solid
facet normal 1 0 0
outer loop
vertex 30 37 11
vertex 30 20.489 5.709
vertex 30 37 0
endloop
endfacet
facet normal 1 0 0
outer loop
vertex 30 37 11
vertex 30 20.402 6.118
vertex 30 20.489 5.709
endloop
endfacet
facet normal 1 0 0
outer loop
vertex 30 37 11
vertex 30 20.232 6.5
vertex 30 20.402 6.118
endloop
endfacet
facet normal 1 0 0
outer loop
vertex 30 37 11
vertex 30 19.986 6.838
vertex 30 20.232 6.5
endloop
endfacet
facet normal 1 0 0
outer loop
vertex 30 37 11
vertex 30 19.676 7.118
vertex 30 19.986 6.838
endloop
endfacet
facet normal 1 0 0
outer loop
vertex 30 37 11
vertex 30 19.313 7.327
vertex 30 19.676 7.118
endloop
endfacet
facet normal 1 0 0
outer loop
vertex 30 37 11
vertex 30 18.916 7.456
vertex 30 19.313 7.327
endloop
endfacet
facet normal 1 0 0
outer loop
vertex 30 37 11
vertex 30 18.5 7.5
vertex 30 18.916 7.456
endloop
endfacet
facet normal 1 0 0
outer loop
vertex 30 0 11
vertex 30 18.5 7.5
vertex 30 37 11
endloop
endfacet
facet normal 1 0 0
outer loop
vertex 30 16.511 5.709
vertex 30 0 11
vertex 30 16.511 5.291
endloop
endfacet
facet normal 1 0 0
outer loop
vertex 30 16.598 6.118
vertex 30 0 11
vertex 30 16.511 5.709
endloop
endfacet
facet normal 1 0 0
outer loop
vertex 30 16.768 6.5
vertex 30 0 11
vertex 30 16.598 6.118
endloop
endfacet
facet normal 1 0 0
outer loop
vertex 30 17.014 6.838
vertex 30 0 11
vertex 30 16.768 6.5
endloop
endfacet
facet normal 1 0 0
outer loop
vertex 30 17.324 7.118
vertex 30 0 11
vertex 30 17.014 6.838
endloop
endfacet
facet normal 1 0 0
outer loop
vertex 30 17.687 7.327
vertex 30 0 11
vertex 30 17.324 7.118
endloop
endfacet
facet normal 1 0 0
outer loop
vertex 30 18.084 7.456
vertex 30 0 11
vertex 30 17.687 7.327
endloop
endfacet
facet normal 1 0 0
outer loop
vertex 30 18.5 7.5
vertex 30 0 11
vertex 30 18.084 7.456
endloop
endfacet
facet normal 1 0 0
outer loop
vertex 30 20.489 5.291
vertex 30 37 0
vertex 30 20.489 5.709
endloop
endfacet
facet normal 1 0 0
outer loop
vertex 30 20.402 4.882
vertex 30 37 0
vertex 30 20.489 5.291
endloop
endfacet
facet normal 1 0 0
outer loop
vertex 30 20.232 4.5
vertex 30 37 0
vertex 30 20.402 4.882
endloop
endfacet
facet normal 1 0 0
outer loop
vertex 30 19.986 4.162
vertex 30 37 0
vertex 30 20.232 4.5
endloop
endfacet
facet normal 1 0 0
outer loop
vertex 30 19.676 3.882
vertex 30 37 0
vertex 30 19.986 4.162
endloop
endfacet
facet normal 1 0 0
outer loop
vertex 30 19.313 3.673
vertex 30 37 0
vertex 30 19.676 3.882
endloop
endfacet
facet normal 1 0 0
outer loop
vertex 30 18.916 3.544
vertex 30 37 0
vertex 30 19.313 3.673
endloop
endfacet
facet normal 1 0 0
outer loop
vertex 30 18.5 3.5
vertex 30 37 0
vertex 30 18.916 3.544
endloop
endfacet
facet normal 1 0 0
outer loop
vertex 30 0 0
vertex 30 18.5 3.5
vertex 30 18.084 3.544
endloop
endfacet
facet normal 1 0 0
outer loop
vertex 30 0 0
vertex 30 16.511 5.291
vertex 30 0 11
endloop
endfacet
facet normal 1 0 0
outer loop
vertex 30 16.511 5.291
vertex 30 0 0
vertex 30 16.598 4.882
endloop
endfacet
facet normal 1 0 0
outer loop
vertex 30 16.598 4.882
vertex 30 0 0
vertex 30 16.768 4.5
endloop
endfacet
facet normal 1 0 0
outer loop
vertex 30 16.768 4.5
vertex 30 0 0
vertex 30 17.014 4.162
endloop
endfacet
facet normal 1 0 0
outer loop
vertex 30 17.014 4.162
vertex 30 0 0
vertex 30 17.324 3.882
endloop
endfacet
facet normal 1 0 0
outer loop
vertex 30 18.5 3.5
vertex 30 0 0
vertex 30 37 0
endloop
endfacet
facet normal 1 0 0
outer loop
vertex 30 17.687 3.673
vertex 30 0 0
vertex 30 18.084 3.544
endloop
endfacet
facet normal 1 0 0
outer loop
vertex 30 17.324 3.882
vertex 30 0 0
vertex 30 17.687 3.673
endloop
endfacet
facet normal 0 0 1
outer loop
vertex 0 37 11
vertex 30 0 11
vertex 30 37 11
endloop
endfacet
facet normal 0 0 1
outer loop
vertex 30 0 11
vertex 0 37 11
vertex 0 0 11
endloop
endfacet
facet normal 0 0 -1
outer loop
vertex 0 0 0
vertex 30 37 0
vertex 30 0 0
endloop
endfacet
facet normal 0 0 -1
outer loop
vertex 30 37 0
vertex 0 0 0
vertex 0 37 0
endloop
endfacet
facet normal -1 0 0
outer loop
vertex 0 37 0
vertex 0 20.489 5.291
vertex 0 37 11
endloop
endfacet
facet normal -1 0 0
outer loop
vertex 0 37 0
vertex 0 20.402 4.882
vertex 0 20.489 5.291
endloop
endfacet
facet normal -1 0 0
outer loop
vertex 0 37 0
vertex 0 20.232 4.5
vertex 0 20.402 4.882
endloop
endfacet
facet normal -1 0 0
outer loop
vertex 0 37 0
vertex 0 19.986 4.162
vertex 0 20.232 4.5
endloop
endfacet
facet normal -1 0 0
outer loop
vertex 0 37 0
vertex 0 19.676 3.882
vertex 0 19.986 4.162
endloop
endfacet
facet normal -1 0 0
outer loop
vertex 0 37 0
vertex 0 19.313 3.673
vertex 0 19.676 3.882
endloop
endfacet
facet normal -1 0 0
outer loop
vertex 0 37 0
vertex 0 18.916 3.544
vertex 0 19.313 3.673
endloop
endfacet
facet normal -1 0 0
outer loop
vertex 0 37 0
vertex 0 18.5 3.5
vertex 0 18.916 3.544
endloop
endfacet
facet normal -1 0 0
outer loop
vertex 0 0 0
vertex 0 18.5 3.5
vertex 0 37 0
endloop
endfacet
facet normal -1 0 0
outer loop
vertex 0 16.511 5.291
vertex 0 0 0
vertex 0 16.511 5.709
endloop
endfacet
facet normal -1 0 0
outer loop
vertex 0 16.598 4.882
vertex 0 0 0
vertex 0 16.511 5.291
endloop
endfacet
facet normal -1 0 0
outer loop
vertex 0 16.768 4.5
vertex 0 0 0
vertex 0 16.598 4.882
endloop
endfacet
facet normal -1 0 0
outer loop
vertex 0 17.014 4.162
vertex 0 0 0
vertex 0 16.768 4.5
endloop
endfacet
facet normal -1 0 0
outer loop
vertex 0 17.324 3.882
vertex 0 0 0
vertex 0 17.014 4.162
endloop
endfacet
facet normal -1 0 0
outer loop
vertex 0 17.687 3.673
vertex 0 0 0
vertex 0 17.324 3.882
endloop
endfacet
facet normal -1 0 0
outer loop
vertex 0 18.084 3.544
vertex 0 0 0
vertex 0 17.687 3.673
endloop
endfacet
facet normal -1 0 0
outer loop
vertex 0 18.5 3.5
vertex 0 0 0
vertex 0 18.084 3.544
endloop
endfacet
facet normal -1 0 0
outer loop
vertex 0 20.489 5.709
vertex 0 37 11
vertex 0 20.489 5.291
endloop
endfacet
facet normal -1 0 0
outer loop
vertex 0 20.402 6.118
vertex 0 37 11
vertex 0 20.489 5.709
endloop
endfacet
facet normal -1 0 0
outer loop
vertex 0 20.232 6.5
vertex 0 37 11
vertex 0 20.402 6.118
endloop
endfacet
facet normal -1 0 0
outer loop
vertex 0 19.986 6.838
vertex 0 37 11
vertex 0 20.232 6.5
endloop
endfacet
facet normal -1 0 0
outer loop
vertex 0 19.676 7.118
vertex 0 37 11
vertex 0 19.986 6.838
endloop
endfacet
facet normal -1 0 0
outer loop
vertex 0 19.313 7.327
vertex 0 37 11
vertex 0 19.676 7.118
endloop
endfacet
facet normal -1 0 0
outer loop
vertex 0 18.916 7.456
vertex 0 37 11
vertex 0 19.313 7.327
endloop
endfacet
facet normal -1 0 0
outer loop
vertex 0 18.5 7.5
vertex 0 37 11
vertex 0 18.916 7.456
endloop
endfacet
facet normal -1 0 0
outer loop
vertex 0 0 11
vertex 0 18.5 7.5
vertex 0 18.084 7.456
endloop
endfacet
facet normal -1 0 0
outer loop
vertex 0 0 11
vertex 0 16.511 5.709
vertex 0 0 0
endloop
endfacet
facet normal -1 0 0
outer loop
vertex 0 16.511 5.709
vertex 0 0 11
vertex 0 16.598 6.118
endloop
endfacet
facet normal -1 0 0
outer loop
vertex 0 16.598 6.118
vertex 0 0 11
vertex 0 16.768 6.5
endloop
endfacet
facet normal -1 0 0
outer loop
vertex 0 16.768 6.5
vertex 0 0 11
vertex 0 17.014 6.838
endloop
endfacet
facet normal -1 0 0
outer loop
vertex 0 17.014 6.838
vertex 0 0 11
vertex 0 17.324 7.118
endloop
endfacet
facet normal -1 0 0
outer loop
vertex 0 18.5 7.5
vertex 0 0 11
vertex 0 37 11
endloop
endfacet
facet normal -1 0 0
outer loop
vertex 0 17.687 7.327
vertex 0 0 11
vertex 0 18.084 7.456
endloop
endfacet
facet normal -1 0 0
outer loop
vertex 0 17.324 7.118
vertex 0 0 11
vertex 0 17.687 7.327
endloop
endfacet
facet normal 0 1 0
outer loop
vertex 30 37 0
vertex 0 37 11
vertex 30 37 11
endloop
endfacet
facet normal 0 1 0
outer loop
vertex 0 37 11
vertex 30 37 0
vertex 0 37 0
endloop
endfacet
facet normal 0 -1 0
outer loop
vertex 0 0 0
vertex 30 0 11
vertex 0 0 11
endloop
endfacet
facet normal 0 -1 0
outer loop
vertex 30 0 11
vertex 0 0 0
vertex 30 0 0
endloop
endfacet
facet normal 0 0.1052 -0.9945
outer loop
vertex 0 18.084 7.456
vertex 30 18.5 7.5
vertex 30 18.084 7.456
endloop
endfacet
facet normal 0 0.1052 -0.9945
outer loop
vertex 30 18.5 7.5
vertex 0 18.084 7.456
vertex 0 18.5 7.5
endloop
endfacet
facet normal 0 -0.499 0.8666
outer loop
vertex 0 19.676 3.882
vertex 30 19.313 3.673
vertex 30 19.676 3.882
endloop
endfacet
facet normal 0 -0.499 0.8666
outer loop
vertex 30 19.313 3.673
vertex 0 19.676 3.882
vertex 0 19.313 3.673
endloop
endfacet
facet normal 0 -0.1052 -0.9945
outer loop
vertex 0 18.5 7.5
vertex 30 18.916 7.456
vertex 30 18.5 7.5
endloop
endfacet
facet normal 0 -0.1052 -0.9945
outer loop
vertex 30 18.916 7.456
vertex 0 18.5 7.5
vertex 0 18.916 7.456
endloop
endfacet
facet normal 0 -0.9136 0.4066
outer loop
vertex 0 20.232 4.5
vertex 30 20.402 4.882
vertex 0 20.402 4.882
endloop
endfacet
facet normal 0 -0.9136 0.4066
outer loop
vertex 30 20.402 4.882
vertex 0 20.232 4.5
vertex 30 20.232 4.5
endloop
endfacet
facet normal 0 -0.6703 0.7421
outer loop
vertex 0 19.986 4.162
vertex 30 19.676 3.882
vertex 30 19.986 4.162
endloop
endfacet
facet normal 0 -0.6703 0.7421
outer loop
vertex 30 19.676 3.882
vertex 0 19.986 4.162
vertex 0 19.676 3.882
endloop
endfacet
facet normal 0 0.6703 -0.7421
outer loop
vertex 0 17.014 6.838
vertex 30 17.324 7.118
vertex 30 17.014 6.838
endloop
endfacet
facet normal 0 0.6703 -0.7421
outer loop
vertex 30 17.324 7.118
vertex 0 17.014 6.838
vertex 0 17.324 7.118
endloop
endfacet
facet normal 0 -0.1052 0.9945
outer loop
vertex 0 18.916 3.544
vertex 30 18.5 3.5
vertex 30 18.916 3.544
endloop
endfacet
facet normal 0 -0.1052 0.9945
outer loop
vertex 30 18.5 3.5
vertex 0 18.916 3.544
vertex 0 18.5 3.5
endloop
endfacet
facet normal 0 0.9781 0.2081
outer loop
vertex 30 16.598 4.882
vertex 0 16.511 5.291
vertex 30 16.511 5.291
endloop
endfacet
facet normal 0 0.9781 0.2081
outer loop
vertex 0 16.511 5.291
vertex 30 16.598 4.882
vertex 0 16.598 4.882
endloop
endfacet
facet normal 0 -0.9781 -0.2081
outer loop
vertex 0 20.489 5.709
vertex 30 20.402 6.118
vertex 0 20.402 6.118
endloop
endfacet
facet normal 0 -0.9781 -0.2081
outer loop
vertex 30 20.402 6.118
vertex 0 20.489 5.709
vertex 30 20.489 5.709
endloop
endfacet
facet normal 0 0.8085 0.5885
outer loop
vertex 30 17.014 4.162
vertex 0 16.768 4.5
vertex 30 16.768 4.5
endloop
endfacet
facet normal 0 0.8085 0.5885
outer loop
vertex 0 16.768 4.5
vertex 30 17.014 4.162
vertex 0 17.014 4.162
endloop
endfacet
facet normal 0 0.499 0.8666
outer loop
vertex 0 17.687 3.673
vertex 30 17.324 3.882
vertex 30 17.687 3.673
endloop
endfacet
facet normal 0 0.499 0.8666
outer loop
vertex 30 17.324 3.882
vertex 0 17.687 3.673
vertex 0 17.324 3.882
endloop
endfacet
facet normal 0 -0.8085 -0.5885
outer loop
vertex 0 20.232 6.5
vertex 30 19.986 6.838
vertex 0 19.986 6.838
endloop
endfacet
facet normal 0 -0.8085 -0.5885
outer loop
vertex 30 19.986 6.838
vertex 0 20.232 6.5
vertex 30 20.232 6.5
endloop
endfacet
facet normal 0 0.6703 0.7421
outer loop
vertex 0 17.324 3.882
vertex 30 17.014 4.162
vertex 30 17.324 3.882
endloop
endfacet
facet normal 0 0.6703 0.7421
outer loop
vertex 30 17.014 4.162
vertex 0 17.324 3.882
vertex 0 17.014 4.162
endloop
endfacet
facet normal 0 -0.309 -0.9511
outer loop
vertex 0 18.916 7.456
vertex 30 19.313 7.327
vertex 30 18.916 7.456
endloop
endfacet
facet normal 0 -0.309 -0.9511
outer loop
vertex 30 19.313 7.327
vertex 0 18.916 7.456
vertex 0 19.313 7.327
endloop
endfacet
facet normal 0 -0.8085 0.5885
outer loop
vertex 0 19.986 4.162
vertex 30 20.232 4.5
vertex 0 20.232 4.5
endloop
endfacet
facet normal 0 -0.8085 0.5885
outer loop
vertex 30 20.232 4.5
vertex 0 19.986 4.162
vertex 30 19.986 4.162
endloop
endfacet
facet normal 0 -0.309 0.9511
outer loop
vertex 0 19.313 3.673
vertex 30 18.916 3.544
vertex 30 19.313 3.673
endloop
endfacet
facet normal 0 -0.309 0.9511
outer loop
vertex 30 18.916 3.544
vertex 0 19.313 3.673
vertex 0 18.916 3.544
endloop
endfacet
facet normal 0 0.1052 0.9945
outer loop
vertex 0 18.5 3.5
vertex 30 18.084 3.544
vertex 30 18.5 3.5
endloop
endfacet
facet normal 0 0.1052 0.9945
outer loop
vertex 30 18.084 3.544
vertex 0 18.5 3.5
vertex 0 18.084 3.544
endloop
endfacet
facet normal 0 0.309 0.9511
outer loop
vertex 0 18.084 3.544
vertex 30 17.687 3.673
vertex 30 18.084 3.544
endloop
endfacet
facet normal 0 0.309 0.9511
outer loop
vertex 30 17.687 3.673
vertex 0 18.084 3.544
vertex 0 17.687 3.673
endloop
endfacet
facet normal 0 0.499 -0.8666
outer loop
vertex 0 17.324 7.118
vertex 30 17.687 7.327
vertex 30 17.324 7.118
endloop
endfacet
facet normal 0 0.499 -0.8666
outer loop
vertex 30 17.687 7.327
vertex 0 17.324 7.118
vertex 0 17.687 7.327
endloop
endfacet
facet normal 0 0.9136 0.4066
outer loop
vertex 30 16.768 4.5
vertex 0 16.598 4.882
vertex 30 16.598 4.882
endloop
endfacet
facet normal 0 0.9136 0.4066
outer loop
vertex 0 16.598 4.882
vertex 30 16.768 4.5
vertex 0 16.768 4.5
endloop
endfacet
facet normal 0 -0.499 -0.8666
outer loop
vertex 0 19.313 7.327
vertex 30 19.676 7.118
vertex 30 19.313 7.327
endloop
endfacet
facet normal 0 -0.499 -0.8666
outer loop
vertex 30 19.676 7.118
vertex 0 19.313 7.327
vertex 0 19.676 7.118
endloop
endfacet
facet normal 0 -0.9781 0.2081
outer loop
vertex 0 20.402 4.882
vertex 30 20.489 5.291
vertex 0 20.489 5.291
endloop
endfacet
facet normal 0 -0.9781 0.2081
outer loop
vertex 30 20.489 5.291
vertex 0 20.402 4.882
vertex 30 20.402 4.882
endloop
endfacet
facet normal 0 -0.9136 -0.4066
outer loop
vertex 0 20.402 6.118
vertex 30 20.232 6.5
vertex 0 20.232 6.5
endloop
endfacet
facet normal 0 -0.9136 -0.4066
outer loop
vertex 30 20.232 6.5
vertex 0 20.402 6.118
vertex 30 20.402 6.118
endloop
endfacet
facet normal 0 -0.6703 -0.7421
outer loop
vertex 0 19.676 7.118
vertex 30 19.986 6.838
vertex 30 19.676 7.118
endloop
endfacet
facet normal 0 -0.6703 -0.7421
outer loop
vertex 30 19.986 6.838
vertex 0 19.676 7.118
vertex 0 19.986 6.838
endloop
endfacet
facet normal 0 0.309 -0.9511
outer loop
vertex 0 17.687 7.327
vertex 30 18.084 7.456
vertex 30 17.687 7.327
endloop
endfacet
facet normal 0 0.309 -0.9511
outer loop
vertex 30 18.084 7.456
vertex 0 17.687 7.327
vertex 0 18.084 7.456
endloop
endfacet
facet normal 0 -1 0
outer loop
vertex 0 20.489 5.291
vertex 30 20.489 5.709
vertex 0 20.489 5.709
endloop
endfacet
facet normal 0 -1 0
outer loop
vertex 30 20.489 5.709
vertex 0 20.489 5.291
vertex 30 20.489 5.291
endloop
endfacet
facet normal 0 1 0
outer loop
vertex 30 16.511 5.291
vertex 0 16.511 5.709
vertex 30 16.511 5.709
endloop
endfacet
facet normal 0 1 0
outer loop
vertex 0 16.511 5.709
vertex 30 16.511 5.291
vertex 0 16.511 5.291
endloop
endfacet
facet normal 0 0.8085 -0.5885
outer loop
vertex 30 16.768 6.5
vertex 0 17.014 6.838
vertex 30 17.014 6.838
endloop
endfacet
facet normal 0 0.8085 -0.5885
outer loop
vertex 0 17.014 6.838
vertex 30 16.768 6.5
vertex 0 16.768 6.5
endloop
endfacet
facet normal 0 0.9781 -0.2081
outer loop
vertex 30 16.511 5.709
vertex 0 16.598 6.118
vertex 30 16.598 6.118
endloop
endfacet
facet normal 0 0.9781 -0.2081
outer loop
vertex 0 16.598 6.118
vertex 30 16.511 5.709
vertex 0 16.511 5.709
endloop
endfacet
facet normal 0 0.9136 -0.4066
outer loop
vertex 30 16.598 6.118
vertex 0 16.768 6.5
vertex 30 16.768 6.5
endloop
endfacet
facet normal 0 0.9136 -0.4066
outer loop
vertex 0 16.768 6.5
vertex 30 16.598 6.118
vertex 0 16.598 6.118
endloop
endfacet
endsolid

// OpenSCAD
// file: config.scad
// Author: Mihai Oltean, www.tcreate.org, mihai.oltean@gmail.com
// More details: jenny5.org
// Source: github.com/jenny5-robot
// MIT License
//--------------------------------------------------------------

aluminium_color = "Silver";
screw_color = "LightSlateGray";
frame_color = aluminium_color;
shaft_color = "Silver";
plastic_color = "LimeGreen";
pulley_color = "DarkSlateGray";
// file: params_basic_components.scad
// Author: Mihai Oltean, www.tcreate.org, mihai.oltean@gmail.com
// More details: jenny5.org
// Source: github.com/jenny5-robot
// MIT License
//--------------------------------------------------------------

spring_length = 20;

smooth_rod_8_radius = 4;
smooth_rod_10_radius = 5;
smooth_rod_12_radius = 6;

tolerance = 0.1;
display_tolerance = 1;

overlap_tolerance = 0.01;


wall_thick_1 = 1;
wall_thick_2 = 2;
wall_thick_3 = 3;
wall_thick_4 = 4;
wall_thick_5 = 5;
wall_thick_5_5 = 5.5;
wall_thick_6 = 6;
wall_thick_7 = 7;
wall_thick_8 = 8;
wall_thick_9 = 9;
wall_thick_10 = 10;
wall_thick_12 = 10;

wrench_radius = 11;

ghidaj_radius = 4;
ghidaj_radius_12 = 6;

canal_diameter = 8.22;
canal_height = 2.2;

filament_radius = 0.9;

bowden_tube_radius = 2.5;

m3_tolerance = 0.1;

latura_mare_L = 40;
latura_mica_L = 15;
grosime_perete_L = 3;

latura_L_50x50 = 50;
latura_L_40x40 = 40;

latura_U_50x50 = 50;
latura_U_40x40 = 40;


tolerance_z = [0, 0, tolerance];
tolerance_x = [tolerance, 0, 0];
tolerance_y = [0, tolerance, 0];

display_tolerance_z = [0, 0, display_tolerance];
display_tolerance_x = [display_tolerance, 0, 0];
display_tolerance_y = [0, display_tolerance, 0];
// main file
// Author: Mihai Oltean, www.tcreate.org, mihai.oltean@gmail.com
// More details: jenny5.org
// Source: github.com/jenny5-robot
// MIT License
//--------------------------------------------------------------

include <params_basic_components.scad>
include <config.scad>

//---------------------------------------------------------------
module spacer_with_2_holes(length, width, height, distance_between_holes)
{
    difference(){
        cube([length, width, height]);
        translate ([0, (width - distance_between_holes) / 2, height / 2] - display_tolerance_x) rotate ([0, 90, 0]) cylinder (h = length + 2 * display_tolerance, r = 2, $fn = 30);
        translate ([0, width - (width - distance_between_holes) / 2, height / 2] - display_tolerance_x) rotate ([0, 90, 0]) cylinder (h = length + 2 * display_tolerance, r = 2, $fn = 30);
    }
}
//---------------------------------------------------------------
module spacer_with_1_hole(length, width, height)
{
    difference(){
        color(plastic_color) cube([length, width, height]);
        translate ([0, width / 2, height / 2] - display_tolerance_x) rotate ([0, 90, 0]) cylinder (h = length + 2 * display_tolerance, r = 2, $fn = 30);
    }
}
//---------------------------------------------------------------
module spacer_with_1_hole_with_ears(length, width, height)
{
    difference(){
        cube([length, width, height]);
        translate ([0, width / 2, height / 2] - display_tolerance_x) rotate ([0, 90, 0]) cylinder (h = length + 2 * display_tolerance, r = 2, $fn = 30);
    }
}
//---------------------------------------------------------------
module spacer_with_2_holes_and_screw_holder(length, width, height, distance_between_holes)
{
    difference(){
        union(){
          cube([length, width, height]);
          translate ([0, 0, height / 2]) rotate([0, 90, 0]) cylinder (h = length, r = 5, $fn = 30);
        }
        translate ([(length - distance_between_holes) / 2, width / 2, 0] - display_tolerance_z) cylinder (h = height + 2 * display_tolerance, r = 2, $fn = 30);
        translate ([length - (length - distance_between_holes) / 2, width / 2, 0] - display_tolerance_z) cylinder (h = height + 2 * display_tolerance, r = 2, $fn = 30);
            translate ([0, 0, height / 2]) rotate([0, 90, 0]) cylinder (h = length, r = 1.5, $fn = 30);
    }
}
//---------------------------------------------------------------
module spacer_with_1_hole_empty(length, width, height, wall_thick)
{
    difference(){
        cube([length, width, height]);
        // scoate cutie
        translate ([wall_thick, wall_thick, wall_thick]) cube([length - 2 * wall_thick, width, height - 2 * wall_thick]);
        // gaura verticala
        translate ([length / 2, wall_thick + (width - wall_thick) / 2, 0] - display_tolerance_z) cylinder (h = height + 2 * display_tolerance, r = 2, $fn = 30);
        
        translate ([length / 2, 0, wall_thick]) cylinder (h = 15, r = 11, $fn = 30);
        translate ([length / 2, 0, height - wall_thick - 15]) cylinder (h = 15, r = 11, $fn = 30);
        
        // gaura orizontala
        translate ([0, wall_thick + (width - wall_thick) / 2, height / 2] - display_tolerance_x) rotate([0, 90, 0]) cylinder (h = length + 2 * display_tolerance, r = 1.5, $fn = 30);
    }
}
//---------------------------------------------------------------

//spacer_with_2_holes(17, 40, 11, 31);

//spacer_with_2_holes(35, 40, 11, 31);

//spacer_with_2_holes(86, 40, 11, 32);

//spacer_with_2_holes(38, 40, 11, 31);

//spacer_with_2_holes(34, 40, 11, 29);

//spacer_with_2_holes_and_screw_holder(37, 12, 73, 25);

//spacer_with_1_hole_empty(37, 13, 73, 3);
//spacer_with_1_hole_empty(37, 13, 90, 3);

spacer_with_1_hole(30, 37, 11);
